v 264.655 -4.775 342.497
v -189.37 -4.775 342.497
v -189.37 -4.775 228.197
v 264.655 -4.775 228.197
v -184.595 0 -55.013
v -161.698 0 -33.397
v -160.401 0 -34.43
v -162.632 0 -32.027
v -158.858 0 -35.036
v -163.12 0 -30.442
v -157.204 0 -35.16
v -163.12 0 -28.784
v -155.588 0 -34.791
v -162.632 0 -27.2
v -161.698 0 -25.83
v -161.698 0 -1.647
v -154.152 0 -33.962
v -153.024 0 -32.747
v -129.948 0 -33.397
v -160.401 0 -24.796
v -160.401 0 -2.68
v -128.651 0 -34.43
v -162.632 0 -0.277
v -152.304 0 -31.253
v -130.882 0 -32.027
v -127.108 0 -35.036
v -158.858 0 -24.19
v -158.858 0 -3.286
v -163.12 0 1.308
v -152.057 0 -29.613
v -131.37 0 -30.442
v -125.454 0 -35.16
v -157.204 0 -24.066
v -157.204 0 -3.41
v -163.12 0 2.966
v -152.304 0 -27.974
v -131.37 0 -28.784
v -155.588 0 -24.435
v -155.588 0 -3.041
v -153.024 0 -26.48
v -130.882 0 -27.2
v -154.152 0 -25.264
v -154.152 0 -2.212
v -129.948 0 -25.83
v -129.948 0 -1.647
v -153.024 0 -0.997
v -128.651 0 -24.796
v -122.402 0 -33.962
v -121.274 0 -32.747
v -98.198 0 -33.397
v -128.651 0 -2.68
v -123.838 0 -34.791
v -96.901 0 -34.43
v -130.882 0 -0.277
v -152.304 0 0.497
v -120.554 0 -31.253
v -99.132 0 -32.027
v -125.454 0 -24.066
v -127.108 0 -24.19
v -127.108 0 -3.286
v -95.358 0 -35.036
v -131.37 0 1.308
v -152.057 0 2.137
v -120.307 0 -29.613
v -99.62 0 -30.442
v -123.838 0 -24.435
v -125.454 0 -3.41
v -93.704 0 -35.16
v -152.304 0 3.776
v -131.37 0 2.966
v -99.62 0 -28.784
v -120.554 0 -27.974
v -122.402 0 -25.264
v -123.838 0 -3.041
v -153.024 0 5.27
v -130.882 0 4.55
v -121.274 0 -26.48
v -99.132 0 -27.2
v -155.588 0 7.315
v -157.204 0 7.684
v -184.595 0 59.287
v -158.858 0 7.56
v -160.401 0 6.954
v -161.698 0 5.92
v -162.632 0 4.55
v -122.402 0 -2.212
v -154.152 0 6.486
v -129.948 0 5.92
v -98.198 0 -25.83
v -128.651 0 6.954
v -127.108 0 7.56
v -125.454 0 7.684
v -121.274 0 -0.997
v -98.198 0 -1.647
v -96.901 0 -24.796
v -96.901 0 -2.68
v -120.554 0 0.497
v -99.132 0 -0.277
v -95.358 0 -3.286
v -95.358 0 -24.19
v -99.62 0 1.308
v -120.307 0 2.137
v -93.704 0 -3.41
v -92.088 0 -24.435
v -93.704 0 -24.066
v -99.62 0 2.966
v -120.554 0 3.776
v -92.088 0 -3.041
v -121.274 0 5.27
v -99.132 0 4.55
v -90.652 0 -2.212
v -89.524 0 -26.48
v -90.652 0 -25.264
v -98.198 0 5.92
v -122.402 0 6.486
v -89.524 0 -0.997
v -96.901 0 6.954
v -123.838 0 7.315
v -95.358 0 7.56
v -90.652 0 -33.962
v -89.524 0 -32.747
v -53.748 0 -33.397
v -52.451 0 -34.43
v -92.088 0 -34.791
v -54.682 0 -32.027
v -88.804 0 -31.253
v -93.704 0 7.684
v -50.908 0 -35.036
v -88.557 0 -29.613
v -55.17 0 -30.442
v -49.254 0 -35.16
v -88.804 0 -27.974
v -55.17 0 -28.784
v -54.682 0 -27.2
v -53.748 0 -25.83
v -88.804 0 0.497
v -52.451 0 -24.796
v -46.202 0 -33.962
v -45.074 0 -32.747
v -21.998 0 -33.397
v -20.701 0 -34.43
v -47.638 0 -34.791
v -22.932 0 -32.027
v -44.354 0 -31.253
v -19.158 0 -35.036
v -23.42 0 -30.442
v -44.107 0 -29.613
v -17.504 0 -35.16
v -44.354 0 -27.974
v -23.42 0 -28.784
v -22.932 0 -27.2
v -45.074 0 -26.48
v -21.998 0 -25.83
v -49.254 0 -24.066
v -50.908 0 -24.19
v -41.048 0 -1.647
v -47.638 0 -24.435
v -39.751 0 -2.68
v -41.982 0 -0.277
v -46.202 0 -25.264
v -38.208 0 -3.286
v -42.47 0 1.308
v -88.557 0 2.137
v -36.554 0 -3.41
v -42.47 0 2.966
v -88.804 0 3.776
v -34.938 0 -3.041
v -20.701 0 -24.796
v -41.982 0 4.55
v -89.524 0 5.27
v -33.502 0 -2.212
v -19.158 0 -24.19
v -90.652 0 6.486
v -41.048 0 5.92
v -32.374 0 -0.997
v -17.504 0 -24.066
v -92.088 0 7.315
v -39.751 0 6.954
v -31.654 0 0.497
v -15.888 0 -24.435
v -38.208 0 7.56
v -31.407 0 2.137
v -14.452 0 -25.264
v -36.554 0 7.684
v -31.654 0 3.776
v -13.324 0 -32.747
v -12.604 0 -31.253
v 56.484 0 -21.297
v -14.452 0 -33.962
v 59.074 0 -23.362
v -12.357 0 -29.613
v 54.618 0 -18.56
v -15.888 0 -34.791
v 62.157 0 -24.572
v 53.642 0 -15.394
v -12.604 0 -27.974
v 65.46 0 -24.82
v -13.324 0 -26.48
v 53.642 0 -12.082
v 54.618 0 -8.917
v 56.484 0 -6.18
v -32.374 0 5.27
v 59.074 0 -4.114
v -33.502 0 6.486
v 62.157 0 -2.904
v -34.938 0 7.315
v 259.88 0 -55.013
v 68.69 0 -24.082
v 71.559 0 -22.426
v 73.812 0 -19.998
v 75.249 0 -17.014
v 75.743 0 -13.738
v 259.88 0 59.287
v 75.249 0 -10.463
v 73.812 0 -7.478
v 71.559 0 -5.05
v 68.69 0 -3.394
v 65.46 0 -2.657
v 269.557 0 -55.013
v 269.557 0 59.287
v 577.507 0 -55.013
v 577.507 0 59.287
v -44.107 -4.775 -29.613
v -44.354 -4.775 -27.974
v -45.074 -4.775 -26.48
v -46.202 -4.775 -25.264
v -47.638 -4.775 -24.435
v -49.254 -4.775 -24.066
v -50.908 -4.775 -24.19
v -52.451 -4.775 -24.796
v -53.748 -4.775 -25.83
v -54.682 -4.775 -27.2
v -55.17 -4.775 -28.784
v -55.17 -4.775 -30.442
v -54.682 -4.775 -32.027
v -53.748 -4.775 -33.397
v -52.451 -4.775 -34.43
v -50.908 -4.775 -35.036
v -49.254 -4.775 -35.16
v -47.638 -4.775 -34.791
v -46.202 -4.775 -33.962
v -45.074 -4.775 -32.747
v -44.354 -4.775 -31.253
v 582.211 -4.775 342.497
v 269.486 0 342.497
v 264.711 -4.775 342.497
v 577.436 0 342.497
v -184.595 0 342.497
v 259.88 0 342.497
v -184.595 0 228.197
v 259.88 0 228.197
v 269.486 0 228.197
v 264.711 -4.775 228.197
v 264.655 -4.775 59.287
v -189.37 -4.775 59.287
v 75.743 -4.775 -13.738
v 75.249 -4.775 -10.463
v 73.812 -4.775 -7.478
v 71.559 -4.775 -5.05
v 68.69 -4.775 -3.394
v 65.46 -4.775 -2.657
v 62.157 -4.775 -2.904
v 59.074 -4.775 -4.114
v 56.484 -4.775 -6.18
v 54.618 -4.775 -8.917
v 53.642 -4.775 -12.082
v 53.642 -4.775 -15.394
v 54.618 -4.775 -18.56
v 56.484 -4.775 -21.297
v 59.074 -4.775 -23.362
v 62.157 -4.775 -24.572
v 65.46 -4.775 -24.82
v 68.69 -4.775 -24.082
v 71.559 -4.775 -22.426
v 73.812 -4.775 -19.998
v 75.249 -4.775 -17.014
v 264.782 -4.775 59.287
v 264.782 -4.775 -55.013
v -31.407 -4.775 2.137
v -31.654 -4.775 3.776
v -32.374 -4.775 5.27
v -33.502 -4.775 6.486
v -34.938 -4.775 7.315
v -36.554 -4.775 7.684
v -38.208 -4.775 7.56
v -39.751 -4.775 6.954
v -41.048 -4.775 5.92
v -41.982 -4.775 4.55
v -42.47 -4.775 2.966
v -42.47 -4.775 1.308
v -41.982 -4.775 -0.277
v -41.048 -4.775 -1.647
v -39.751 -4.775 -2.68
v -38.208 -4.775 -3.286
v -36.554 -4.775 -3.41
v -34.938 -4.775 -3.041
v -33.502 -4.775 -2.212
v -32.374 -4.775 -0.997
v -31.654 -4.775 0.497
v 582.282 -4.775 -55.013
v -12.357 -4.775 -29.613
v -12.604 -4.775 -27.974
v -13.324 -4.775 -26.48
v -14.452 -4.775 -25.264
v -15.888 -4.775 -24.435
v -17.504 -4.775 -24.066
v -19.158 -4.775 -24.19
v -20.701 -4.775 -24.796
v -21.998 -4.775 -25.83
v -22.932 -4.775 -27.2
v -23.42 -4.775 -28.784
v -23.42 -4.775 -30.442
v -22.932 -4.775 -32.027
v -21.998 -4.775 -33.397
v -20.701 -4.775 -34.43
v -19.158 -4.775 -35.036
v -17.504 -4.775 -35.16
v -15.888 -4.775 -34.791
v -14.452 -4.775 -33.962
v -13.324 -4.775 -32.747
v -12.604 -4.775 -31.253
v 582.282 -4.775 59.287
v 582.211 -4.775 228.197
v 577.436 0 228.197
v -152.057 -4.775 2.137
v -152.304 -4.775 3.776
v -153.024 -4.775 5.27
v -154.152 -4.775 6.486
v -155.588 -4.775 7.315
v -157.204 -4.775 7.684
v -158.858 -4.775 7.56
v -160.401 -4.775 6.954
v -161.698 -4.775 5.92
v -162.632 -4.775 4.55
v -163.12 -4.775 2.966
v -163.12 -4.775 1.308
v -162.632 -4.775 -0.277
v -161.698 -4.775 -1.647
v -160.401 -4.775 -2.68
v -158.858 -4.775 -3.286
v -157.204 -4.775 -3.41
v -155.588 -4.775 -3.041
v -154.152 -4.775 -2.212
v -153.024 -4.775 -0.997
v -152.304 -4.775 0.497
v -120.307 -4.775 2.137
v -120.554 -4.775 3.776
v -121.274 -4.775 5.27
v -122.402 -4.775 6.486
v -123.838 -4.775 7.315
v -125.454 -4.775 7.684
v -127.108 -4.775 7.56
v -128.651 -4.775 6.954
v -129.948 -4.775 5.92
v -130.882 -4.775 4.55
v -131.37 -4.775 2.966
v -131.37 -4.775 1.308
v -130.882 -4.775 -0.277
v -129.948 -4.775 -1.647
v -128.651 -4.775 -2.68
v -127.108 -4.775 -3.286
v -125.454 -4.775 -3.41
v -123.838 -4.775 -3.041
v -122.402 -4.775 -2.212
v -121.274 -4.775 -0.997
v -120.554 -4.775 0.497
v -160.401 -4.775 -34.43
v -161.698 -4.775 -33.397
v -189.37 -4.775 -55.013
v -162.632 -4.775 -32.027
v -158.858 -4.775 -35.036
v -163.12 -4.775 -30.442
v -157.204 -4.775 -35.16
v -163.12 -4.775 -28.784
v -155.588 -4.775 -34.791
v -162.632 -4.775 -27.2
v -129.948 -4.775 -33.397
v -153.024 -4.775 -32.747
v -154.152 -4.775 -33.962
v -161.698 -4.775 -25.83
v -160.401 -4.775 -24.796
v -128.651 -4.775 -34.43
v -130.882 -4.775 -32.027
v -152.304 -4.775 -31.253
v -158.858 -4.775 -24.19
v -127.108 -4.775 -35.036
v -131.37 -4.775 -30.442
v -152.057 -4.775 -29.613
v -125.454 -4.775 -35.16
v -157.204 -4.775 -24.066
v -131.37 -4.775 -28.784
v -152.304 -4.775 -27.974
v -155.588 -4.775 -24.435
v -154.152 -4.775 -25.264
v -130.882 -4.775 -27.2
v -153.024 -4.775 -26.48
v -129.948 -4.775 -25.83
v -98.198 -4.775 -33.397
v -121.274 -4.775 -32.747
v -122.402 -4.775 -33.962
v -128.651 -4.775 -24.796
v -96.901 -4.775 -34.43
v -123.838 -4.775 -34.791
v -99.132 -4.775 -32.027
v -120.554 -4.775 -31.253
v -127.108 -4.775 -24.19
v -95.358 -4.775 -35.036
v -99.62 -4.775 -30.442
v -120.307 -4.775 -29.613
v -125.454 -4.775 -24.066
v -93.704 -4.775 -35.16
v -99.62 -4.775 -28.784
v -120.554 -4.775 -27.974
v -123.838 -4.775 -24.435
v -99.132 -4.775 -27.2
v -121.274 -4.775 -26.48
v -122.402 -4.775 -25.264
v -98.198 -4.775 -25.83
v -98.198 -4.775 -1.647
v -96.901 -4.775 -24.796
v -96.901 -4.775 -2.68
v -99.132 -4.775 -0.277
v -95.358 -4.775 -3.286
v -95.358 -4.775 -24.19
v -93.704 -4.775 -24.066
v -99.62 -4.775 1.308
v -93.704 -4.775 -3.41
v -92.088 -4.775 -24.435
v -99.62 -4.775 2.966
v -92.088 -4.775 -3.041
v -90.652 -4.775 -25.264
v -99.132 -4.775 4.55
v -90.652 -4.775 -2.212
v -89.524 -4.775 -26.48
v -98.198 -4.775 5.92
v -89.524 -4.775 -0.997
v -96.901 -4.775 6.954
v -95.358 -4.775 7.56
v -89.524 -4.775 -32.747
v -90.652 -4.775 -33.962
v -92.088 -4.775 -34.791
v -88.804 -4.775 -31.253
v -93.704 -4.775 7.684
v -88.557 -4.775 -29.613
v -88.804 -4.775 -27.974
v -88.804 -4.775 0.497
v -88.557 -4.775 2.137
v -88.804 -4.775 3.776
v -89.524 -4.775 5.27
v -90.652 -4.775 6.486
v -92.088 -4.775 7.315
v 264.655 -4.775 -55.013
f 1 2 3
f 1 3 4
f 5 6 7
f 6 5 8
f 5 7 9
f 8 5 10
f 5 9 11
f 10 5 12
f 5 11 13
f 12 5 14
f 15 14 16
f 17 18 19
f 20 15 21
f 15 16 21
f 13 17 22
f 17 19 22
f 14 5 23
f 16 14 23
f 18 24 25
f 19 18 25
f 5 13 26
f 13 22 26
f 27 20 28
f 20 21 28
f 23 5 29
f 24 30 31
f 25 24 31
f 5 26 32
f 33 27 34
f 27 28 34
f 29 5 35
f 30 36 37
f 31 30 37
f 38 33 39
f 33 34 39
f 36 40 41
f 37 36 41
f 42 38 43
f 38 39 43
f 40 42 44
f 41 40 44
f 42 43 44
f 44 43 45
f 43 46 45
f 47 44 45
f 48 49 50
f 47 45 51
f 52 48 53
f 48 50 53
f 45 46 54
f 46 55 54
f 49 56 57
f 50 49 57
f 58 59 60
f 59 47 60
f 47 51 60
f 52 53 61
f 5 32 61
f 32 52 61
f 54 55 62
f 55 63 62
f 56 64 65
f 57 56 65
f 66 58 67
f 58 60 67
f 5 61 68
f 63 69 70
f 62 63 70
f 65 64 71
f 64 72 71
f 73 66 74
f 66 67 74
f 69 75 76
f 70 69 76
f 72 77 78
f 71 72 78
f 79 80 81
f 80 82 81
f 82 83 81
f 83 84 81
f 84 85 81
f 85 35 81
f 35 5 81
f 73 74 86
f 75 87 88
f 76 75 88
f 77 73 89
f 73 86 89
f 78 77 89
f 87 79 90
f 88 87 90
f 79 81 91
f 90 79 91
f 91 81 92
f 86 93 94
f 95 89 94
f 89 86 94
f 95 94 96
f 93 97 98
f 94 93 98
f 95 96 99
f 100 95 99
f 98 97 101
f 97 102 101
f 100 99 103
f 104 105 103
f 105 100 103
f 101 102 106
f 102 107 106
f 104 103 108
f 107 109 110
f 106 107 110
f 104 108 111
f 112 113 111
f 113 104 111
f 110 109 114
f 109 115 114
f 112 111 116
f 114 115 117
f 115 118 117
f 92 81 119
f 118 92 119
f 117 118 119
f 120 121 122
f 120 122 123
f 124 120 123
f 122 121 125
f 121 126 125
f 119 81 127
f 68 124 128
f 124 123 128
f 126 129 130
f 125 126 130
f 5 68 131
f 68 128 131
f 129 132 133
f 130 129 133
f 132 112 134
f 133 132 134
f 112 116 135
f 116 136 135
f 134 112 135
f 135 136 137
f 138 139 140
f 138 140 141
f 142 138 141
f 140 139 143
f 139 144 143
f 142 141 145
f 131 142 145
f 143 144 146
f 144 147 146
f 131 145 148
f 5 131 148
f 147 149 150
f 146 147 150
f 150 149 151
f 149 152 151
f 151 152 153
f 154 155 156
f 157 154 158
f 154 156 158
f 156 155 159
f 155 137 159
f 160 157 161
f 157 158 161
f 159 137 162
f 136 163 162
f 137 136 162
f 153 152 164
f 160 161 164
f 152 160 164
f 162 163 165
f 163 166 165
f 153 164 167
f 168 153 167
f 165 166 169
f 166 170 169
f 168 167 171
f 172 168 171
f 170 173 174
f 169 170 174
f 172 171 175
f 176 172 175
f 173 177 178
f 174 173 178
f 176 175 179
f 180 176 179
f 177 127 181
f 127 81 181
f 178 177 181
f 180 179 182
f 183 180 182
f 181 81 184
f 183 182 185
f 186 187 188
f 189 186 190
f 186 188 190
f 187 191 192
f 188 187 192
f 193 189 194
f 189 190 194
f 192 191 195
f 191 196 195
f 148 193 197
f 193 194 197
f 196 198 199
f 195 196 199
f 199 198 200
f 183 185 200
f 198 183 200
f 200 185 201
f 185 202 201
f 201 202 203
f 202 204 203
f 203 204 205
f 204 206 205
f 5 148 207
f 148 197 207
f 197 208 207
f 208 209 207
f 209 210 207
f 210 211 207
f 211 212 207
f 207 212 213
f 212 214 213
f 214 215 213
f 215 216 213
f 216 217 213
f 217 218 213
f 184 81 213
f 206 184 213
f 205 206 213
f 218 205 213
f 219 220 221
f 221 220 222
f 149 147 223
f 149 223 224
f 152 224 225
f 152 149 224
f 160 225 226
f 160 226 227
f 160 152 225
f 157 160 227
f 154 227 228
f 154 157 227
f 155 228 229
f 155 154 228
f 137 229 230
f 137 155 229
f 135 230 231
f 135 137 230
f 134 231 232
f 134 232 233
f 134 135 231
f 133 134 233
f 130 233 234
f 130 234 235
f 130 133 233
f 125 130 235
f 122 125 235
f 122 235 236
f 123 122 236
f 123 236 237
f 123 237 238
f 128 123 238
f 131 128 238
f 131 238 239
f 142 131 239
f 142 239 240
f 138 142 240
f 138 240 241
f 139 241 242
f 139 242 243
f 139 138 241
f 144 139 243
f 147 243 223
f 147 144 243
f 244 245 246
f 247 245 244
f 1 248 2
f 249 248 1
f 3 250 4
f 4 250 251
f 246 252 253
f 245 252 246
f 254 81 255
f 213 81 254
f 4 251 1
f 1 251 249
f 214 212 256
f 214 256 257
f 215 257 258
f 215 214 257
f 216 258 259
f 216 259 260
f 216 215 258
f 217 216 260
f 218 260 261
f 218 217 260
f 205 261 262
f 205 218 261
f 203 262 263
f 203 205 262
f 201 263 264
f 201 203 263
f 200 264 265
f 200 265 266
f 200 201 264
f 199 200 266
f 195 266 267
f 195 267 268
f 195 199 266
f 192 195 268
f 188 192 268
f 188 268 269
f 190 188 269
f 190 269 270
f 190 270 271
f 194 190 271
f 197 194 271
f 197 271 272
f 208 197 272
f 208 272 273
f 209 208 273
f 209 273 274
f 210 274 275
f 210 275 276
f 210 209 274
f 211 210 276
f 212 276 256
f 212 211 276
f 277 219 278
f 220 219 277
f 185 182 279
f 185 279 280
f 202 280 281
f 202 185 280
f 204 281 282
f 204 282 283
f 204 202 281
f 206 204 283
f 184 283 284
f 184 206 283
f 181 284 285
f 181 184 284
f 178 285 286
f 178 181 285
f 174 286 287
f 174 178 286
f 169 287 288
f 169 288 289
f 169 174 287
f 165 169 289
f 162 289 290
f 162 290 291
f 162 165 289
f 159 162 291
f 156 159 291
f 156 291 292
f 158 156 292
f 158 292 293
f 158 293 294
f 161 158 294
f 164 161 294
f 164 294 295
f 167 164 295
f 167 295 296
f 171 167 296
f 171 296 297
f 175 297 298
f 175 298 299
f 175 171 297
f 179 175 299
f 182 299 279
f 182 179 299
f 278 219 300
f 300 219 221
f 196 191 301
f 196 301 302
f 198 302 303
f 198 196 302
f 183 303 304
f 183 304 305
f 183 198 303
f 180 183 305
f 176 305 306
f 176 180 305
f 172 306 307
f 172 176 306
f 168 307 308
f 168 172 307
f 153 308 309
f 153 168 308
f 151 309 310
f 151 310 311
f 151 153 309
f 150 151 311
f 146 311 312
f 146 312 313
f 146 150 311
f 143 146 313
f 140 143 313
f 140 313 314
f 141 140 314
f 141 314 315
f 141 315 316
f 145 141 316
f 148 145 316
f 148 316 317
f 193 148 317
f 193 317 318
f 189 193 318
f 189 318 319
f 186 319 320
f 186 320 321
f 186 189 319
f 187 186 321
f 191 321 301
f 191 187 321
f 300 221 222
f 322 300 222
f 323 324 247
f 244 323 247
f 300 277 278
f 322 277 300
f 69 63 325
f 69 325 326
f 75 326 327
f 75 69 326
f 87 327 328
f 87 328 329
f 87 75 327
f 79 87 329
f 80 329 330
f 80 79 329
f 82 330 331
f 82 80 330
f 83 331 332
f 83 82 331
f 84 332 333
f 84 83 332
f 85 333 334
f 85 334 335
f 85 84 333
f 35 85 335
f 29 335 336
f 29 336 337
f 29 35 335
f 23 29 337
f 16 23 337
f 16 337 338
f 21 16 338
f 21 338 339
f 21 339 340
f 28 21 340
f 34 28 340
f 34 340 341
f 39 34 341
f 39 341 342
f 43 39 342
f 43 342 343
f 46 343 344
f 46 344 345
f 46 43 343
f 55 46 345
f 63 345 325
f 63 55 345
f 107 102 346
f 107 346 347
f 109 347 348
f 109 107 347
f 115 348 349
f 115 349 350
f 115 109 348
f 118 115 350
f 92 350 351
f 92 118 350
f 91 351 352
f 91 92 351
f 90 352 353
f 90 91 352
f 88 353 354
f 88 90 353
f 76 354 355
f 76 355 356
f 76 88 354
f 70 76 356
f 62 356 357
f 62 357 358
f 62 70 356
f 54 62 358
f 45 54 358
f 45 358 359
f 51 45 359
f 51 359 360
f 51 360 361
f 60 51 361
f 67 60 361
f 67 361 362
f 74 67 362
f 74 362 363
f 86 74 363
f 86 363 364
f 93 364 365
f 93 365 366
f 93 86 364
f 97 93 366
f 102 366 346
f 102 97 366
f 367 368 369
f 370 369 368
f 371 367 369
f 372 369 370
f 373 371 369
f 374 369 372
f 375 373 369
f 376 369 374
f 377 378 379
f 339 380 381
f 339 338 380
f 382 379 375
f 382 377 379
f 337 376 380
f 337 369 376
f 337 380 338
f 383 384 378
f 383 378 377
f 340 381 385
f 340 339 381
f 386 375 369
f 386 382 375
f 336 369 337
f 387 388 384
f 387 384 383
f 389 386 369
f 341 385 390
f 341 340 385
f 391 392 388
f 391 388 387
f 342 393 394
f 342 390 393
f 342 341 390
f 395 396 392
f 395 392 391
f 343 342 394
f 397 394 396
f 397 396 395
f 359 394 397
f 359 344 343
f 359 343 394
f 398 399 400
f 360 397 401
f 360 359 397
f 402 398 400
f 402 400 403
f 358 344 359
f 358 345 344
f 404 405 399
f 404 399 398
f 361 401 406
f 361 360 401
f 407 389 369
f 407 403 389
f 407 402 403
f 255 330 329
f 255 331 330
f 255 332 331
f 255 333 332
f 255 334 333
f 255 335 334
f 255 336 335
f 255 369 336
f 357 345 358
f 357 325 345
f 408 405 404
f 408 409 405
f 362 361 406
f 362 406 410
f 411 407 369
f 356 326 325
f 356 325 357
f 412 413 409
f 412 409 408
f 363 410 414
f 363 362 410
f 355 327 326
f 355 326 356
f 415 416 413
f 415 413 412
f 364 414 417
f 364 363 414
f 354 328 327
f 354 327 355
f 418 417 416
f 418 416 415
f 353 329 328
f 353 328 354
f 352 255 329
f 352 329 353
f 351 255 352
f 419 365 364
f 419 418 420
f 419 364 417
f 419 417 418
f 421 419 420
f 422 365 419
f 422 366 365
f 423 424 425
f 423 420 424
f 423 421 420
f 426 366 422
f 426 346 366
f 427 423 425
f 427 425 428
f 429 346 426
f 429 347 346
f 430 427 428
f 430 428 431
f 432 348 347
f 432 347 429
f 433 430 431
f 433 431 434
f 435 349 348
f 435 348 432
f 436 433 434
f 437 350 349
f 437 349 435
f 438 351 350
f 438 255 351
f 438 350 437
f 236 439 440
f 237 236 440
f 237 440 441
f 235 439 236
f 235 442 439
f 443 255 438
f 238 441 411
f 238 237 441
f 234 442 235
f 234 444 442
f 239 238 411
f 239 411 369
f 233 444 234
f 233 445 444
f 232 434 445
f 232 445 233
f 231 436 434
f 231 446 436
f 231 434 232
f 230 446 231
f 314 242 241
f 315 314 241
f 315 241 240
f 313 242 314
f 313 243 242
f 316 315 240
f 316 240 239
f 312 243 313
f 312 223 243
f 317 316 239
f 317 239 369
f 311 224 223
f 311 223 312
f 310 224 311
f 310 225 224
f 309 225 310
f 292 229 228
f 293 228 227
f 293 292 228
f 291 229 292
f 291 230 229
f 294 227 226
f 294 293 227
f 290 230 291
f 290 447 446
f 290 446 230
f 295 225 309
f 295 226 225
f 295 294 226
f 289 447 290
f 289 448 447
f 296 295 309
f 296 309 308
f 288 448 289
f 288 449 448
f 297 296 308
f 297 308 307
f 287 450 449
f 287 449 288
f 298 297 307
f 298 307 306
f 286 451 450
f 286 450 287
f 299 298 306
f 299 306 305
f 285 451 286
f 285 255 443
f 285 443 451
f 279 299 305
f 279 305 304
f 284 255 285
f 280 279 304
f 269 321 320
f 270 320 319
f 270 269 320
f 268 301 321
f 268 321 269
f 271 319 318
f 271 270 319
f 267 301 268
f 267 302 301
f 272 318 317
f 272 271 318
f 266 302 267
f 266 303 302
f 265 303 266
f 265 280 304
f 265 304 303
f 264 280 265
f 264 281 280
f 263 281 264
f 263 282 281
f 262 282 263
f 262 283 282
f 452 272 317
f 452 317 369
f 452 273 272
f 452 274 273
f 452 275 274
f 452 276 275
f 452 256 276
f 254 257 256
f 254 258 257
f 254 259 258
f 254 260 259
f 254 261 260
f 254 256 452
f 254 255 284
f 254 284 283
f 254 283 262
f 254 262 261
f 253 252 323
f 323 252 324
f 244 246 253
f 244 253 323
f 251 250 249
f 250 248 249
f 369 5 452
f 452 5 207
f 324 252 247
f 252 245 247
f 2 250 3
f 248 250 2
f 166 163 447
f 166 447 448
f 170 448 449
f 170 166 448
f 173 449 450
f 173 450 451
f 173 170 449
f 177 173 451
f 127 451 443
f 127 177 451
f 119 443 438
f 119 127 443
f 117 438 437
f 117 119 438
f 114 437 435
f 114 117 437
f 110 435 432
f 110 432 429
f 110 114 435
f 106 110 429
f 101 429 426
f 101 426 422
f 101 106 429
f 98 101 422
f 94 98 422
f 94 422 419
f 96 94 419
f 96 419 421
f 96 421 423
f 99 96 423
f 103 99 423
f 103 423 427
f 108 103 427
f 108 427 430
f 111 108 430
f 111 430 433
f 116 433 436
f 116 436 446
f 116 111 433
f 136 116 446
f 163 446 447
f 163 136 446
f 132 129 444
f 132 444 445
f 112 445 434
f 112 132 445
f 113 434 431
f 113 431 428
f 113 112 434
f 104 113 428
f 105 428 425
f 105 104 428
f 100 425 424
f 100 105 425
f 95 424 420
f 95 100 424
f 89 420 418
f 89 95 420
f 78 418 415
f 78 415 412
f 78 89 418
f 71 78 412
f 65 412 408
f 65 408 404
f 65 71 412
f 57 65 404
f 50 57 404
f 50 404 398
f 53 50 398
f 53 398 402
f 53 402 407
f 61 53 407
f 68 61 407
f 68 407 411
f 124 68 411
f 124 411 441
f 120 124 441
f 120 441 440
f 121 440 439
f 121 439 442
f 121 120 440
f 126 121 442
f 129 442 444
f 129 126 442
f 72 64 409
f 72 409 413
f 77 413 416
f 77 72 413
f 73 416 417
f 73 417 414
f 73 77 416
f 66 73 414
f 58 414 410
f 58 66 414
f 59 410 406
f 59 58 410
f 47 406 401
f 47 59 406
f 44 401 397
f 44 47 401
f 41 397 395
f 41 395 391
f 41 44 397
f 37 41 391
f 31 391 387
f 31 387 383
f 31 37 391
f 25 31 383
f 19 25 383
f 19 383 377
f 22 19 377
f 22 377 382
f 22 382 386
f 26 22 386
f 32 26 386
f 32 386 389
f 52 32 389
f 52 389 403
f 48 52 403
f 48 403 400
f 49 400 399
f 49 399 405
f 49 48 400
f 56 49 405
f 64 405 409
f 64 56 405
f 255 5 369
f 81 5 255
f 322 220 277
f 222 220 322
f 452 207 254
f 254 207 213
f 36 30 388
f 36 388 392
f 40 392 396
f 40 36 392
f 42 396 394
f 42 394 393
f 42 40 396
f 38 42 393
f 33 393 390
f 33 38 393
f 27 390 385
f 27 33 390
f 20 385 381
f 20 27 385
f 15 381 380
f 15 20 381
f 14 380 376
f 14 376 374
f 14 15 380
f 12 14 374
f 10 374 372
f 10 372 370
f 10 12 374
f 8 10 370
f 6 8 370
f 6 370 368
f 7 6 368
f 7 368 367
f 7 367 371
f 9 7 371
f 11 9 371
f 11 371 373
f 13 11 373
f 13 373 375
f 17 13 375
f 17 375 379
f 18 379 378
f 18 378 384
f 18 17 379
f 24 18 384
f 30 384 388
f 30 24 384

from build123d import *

# Parameters (mm, degrees)
F0_W      = 454.025
F0_H      = 114.3
F0_R      = 5.5626
F0_R_2    = 11.1125
F1_DEPTH  = 4.7752
F0_W_2    = 317.5
F2_SIZE   = 4.77519
F2_2_SIZE = 4.77519
F2_3_SIZE = 4.77519
F2_4_SIZE = 4.77519


# Not quite as in the source:
# - a fillet or chamfer is up to 0.001 mm smaller than in the source, because OpenCascade refuses the exact size
# - a feature names something its author has since deleted; it is built from what else it names


with BuildPart() as f1:
    # F0 (on Front) → F1 (new body)
    with BuildSketch(Plane.XZ):
        with Locations((37.6425363503, 2.1368730813)):
            Rectangle(F0_W, F0_H)
        with Locations((-157.6199636497, -29.6131269187)):
            Circle(F0_R, mode=Mode.SUBTRACT)
        with Locations((-125.8699636497, -29.6131269187)):
            Circle(F0_R, mode=Mode.SUBTRACT)
        with Locations((-94.1199636497, -29.6131269187)):
            Circle(F0_R, mode=Mode.SUBTRACT)
        with Locations((-49.6699636497, -29.6131269187)):
            Circle(F0_R, mode=Mode.SUBTRACT)
        with Locations((-17.9199636497, -29.6131269187)):
            Circle(F0_R, mode=Mode.SUBTRACT)
        with Locations((-157.6199636497, 2.1368730813)):
            Circle(F0_R, mode=Mode.SUBTRACT)
        with Locations((-125.8699636497, 2.1368730813)):
            Circle(F0_R, mode=Mode.SUBTRACT)
        with Locations((-94.1199636497, 2.1368730813)):
            Circle(F0_R, mode=Mode.SUBTRACT)
        with Locations((-36.9699636497, 2.1368730813)):
            Circle(F0_R, mode=Mode.SUBTRACT)
        with Locations((64.6300363503, -13.7381269187)):
            Circle(F0_R_2, mode=Mode.SUBTRACT)
    extrude(amount=F1_DEPTH)

    # F2#2 (size 4.7752 in the source; OpenCascade refuses exactly that, so slightly less here)
    f2_2_edges = [f1.edges().sort_by_distance(p)[0] for p in [
        (264.655036, 0, 2.136873),
        (-189.369964, 0, 2.136873),
    ]]
    chamfer(f2_2_edges, length=F2_2_SIZE)


with BuildPart() as f1b:
    # F0 (on Front) → F1, piece 2 (new body)
    with BuildSketch(Plane.XZ):
        with Locations((37.6425363503, 285.3470083714)):
            Rectangle(F0_W, F0_H)
    extrude(amount=F1_DEPTH)

    # F2 (size 4.7752 in the source; OpenCascade refuses exactly that, so slightly less here)
    f2_edges = [f1b.edges().sort_by_distance(p)[0] for p in [
        (264.655036, 0, 285.347008),
        (-189.369964, 0, 285.347008),
    ]]
    chamfer(f2_edges, length=F2_SIZE)


with BuildPart() as f1c:
    # F0 (on Front) → F1, piece 3 (new body)
    with BuildSketch(Plane.XZ):
        with Locations((423.5320413113, 2.1368730813)):
            Rectangle(F0_W_2, F0_H)
    extrude(amount=F1_DEPTH)

    # F2#3 (size 4.7752 in the source; OpenCascade refuses exactly that, so slightly less here)
    f2_3_edges = [f1c.edges().sort_by_distance(p)[0] for p in [
        (582.282041, 0, 2.136873),
        (264.782041, 0, 2.136873),
    ]]
    chamfer(f2_3_edges, length=F2_3_SIZE)


with BuildPart() as f1d:
    # F0 (on Front) → F1, piece 4 (new body)
    with BuildSketch(Plane.XZ):
        with Locations((423.4609160386, 285.3470083714)):
            Rectangle(F0_W_2, F0_H)
    extrude(amount=F1_DEPTH)

    # F2#4 (size 4.7752 in the source; OpenCascade refuses exactly that, so slightly less here)
    f2_4_edges = [f1d.edges().sort_by_distance(p)[0] for p in [
        (264.710916, 0, 285.347008),
        (582.210916, 0, 285.347008),
    ]]
    chamfer(f2_4_edges, length=F2_4_SIZE)


solid = Compound([f1.part, f1b.part, f1c.part, f1d.part])
